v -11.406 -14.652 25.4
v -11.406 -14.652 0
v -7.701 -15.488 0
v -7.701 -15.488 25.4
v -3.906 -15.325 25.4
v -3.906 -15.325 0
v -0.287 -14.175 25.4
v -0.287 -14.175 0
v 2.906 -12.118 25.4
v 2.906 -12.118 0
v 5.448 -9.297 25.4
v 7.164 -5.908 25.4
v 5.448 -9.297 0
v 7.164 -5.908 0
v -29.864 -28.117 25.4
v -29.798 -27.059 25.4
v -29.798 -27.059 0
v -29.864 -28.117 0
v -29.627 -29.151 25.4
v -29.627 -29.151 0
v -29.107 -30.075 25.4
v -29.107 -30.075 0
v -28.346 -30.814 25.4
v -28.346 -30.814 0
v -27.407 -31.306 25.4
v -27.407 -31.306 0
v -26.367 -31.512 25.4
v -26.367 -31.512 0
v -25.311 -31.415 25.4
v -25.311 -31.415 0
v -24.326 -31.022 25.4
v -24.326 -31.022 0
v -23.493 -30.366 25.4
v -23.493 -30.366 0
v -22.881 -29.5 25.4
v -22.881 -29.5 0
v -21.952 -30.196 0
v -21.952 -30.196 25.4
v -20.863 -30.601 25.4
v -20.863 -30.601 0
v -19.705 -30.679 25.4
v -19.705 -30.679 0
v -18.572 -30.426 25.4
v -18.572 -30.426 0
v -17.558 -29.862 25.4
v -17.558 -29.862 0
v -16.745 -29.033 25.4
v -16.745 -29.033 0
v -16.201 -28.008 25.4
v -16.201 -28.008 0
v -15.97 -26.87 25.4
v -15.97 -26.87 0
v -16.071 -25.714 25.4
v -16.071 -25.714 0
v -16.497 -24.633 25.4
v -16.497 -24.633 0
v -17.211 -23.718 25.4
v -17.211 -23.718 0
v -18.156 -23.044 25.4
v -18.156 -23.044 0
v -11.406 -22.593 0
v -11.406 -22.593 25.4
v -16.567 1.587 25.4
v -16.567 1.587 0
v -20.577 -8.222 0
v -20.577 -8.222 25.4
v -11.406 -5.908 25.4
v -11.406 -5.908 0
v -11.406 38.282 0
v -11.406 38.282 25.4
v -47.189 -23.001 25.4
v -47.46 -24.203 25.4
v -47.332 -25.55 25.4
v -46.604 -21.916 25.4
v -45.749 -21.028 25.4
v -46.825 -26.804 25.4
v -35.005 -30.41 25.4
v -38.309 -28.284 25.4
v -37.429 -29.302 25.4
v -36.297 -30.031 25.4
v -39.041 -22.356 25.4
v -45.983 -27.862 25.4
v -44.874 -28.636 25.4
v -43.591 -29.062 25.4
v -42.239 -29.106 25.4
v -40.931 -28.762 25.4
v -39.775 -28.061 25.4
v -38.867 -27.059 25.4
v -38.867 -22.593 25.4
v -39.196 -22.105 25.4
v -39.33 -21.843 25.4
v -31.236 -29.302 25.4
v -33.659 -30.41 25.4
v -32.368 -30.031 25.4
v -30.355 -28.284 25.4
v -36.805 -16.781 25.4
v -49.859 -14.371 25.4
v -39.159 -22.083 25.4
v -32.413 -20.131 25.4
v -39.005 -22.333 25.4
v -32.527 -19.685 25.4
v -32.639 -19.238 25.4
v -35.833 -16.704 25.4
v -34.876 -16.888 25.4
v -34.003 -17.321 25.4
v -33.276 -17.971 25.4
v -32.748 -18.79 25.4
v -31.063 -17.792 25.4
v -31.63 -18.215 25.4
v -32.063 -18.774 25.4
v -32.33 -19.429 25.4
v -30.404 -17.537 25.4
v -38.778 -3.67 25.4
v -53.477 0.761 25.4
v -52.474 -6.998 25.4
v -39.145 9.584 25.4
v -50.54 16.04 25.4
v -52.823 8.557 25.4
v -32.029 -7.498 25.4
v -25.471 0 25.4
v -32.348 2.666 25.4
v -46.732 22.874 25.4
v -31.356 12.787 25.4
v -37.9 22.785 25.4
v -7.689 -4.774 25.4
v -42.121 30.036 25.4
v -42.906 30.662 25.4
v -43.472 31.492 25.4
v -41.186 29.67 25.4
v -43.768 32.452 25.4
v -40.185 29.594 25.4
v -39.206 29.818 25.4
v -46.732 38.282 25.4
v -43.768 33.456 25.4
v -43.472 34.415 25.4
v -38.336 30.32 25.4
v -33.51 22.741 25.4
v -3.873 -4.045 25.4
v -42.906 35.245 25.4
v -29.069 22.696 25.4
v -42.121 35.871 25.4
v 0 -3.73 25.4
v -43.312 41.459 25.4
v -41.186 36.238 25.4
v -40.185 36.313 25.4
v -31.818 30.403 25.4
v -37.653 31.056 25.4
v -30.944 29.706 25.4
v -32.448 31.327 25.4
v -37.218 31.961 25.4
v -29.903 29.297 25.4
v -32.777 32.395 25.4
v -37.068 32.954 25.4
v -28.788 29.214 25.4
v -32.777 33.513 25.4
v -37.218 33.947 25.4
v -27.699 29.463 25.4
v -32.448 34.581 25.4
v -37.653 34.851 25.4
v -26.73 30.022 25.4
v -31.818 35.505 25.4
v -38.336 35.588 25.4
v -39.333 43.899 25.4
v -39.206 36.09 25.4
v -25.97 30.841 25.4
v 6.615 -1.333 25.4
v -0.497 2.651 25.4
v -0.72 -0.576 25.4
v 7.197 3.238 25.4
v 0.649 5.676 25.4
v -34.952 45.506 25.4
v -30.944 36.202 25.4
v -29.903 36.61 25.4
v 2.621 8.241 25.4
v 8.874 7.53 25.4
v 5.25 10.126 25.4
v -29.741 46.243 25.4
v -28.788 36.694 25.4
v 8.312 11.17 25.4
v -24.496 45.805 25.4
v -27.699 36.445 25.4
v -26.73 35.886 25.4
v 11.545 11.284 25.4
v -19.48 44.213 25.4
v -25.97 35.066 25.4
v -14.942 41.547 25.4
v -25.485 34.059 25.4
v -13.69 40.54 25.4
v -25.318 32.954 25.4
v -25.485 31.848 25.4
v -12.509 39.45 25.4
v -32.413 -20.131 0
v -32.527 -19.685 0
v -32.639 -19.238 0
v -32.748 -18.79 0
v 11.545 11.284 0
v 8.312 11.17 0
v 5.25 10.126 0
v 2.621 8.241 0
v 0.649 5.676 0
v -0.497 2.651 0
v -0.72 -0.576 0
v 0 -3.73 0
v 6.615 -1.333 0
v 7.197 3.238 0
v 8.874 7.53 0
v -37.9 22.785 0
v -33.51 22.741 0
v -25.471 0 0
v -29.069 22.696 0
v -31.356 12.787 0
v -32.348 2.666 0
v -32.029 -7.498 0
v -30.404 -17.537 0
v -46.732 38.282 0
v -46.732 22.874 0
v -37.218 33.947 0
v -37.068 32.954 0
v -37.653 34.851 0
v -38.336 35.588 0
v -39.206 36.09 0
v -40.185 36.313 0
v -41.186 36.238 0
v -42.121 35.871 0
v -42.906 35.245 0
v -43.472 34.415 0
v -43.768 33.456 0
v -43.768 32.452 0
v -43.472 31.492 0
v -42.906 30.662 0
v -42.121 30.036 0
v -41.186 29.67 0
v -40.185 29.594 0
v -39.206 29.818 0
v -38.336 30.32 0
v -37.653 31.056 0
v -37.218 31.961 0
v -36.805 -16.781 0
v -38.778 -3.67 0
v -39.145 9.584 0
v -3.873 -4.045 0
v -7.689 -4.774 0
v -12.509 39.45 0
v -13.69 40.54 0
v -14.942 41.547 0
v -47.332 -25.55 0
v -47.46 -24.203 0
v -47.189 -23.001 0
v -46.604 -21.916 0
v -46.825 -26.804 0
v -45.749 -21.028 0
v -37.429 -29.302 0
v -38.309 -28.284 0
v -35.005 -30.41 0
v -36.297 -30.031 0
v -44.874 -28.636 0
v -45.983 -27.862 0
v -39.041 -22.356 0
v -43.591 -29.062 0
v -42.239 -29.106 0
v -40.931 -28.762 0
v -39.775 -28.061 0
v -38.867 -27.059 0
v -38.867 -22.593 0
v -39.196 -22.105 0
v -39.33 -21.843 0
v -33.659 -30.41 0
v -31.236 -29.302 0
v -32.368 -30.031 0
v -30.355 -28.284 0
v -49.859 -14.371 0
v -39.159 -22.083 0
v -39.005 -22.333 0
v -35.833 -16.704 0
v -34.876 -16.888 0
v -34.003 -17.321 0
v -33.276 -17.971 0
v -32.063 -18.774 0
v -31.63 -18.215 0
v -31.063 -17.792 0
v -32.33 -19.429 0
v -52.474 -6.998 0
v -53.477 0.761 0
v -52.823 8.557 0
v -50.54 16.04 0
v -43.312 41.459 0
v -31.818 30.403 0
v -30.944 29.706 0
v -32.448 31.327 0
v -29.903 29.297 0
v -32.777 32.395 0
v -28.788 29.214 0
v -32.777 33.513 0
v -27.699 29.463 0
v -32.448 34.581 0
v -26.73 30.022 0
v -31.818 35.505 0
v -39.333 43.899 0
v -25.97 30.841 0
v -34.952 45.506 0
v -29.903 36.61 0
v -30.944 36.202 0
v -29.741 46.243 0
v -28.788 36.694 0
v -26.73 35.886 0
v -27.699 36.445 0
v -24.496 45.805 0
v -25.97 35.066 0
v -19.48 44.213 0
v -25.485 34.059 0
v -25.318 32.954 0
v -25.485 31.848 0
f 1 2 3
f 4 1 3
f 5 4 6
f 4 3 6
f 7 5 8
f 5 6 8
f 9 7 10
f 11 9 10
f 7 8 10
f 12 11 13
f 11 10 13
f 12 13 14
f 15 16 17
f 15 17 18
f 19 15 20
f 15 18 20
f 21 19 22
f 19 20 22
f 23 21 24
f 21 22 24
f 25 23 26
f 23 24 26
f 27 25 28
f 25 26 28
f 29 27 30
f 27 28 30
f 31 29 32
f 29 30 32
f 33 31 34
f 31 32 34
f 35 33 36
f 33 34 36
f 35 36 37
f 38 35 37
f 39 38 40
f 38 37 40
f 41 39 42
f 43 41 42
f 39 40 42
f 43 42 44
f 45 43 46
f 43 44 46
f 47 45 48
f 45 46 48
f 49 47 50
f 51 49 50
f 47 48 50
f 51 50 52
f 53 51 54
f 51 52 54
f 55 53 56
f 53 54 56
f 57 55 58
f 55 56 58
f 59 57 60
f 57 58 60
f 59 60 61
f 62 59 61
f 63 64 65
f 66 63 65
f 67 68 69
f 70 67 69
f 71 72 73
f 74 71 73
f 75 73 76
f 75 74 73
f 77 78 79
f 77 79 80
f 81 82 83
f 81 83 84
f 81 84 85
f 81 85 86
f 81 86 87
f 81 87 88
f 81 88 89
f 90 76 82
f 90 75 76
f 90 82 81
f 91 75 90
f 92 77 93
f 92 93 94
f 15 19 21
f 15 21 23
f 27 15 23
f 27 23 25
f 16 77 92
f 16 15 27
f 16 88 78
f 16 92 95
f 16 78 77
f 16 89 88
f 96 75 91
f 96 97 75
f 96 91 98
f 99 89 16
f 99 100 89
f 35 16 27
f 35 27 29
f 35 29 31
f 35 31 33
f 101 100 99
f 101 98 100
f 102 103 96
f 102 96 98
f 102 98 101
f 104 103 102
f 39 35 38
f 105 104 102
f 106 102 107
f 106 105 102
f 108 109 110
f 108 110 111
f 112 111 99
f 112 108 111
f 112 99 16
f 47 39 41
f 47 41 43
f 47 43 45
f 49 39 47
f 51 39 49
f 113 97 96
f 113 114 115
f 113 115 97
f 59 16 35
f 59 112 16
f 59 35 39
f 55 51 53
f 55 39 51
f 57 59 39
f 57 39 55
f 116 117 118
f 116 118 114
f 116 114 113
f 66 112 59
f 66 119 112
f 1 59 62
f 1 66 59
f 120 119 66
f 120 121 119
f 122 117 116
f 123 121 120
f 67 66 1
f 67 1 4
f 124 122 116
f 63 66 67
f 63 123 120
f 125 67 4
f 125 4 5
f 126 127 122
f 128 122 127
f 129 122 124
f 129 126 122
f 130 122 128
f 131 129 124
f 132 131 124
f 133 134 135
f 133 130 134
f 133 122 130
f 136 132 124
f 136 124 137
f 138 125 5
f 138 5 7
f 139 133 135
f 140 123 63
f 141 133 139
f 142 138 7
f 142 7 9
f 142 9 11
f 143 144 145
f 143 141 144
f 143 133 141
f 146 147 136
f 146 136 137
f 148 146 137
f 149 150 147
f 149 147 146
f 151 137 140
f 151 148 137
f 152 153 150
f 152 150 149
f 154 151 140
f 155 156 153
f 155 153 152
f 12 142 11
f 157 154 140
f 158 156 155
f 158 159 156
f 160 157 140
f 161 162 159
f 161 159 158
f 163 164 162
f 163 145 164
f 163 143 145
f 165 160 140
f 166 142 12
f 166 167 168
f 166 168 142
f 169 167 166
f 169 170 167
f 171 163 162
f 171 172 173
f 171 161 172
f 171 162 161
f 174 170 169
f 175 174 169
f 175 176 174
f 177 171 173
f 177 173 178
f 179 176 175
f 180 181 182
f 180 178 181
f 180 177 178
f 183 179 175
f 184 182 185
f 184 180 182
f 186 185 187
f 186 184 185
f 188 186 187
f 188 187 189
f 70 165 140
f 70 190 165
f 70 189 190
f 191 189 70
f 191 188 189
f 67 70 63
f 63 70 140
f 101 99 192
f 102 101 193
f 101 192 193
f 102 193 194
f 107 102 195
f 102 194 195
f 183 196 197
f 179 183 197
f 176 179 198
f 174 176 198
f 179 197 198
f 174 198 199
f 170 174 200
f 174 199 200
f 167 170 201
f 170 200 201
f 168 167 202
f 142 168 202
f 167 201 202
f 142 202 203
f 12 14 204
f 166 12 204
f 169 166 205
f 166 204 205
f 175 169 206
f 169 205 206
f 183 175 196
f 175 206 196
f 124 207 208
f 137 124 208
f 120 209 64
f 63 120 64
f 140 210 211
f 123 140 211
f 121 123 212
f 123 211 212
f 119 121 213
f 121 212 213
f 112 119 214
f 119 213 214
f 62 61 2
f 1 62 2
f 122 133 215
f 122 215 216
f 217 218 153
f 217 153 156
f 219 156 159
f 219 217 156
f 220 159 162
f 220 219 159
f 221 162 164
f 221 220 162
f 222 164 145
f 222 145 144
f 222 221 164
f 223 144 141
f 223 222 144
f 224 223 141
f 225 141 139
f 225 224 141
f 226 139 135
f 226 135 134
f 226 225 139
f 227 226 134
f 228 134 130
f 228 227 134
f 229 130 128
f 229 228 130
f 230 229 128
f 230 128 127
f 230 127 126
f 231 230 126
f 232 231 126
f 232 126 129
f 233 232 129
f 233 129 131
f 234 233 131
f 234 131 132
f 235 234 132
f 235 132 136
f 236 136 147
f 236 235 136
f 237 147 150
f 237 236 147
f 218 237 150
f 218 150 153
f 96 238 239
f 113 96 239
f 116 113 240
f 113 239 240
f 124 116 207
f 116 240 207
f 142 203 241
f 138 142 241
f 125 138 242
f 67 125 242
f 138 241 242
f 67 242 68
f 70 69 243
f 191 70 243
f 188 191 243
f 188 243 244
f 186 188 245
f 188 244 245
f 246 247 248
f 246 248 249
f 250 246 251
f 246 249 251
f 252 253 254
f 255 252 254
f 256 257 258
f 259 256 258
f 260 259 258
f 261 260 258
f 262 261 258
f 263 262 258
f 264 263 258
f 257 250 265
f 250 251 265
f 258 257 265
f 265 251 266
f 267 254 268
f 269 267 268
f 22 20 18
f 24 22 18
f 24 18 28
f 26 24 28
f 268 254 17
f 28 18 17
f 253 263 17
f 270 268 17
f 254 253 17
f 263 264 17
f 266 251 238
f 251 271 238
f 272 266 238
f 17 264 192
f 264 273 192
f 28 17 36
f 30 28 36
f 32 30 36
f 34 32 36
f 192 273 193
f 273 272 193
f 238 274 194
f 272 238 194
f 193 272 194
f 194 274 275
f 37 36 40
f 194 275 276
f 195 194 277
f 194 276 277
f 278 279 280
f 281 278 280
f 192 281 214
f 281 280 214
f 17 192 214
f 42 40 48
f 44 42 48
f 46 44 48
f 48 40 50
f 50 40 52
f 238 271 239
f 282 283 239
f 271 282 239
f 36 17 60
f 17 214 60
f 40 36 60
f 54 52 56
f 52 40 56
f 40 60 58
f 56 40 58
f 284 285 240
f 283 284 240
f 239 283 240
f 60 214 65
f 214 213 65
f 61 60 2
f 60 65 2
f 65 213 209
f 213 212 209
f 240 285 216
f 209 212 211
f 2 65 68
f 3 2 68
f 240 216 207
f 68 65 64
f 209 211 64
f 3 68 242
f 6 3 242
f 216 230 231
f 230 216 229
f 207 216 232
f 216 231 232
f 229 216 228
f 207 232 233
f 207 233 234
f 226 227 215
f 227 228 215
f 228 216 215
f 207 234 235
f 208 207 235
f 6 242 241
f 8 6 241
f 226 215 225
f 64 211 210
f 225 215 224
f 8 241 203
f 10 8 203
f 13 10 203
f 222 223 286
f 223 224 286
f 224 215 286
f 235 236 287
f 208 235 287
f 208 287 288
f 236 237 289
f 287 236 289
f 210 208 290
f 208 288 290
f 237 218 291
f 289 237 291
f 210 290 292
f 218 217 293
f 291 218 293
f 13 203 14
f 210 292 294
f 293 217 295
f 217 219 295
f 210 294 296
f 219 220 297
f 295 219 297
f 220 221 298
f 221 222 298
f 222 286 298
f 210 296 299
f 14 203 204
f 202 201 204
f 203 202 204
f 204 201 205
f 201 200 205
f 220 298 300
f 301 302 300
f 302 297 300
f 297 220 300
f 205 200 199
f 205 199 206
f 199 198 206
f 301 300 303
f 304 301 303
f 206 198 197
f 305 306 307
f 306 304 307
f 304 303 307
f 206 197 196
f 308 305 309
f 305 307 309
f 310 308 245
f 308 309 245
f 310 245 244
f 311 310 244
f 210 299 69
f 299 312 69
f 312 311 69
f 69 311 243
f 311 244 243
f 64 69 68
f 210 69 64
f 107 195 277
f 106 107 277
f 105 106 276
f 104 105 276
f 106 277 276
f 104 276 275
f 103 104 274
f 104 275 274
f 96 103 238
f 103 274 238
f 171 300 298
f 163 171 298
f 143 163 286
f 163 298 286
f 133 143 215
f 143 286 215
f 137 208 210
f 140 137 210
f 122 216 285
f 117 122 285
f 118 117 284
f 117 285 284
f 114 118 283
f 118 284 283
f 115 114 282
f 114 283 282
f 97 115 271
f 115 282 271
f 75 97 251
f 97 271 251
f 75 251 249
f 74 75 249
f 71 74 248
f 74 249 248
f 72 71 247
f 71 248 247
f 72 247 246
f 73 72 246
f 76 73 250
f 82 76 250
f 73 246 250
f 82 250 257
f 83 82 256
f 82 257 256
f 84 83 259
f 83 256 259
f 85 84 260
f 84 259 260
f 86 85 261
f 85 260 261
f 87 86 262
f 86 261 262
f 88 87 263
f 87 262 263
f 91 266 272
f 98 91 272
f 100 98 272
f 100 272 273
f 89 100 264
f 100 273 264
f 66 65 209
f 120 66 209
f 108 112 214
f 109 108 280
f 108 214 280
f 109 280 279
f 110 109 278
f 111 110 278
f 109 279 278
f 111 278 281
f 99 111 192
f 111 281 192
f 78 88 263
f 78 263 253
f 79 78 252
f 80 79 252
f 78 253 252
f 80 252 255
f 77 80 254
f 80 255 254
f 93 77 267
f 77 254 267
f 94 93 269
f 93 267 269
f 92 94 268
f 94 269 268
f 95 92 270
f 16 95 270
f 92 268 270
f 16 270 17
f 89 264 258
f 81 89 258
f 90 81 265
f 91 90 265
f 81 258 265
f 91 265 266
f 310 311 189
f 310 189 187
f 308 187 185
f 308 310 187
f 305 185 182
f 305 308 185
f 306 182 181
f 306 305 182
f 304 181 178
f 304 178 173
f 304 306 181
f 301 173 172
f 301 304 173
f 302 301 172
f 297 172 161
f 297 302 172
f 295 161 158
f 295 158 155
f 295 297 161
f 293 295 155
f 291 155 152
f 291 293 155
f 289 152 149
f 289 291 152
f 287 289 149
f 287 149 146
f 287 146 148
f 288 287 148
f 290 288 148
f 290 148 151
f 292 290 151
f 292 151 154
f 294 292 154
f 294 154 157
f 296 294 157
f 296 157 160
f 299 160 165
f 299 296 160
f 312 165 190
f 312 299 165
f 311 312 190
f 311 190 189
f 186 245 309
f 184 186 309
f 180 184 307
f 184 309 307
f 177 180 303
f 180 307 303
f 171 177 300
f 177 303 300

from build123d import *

# Parameters (mm, degrees)
F0_R     = 3.3686848121
F0_R_2   = 3.7503411647
F1_DEPTH = 25.4


# Not quite as in the source:
# - the program builds the solid bodies; features that only make, move or delete a surface that nothing else refers to are left out


with BuildPart() as f1:
    # F0 (on Top) → F1 (new body)
    with BuildSketch(Plane.XY):
        with BuildLine():
            Line((-11.4056267505, -5.9082075022), (-11.4056267505, 38.28210113))
            ThreePointArc((-11.4056267505, 38.28210113), (-13.0902542949, 40.0050046024), (-14.9420781413, 41.5467940758))
            ThreePointArc((-14.9420781413, 41.5467940758), (-24.4960295494, 45.8046369765), (-34.9515650706, 45.5063239844))
            ThreePointArc((-34.9515650706, 45.5063239844), (-41.3833712338, 42.777482568), (-46.7318524877, 38.28210113))
            Line((-46.7318524877, 38.28210113), (-46.7318524877, 22.8735643321))
            Line((-46.7318524877, 22.8735643321), (-37.9002960534, 22.7850040211))
            Line((-37.9002960534, 22.7850040211), (-33.5099794506, 22.7409791874))
            Line((-33.5099794506, 22.7409791874), (-29.0687396191, 22.6964437101))
            ThreePointArc((-29.0687396191, 22.6964437101), (-32.3476402886, 2.6663309949), (-30.4037962217, -17.5370864196))
            ThreePointArc((-30.4037962217, -17.5370864196), (-28.3292963567, -17.9171307498), (-27.2098111607, -19.7045132715))
            ThreePointArc((-27.2098111607, -19.7045132715), (-22.8158840867, -19.1811881286), (-19.9977839656, -22.5927531719))
            ThreePointArc((-19.9977839656, -22.5927531719), (-19.0499304153, -22.7087900697), (-18.1556105797, -23.043577982))
            Line((-18.1556105797, -23.043577982), (-11.4056267505, -22.5927531719))
            Line((-11.4056267505, -22.5927531719), (-11.4056267505, -14.6515189691))
            ThreePointArc((-11.4056267505, -14.6515189691), (-0.2868217682, -14.1752443759), (7.1637327783, -5.9082075022))
            ThreePointArc((7.1637327783, -5.9082075022), (7.197230267, 3.2378107083), (11.5452415215, 11.2842738641))
            ThreePointArc((11.5452415215, 11.2842738641), (1.5408183988, 7.0311325334), (0, -3.7300742697))
            ThreePointArc((0, -3.7300742697), (-5.7908190197, -4.3583061138), (-11.4056267505, -5.9082075022))
        make_face()
        Polygon((-25.470810011, 0), (-16.5671050976, 1.5869429488), (-20.5766428262, -8.2222158089), align=None, mode=Mode.SUBTRACT)
        with Locations((-40.4367111623, 32.953761518)):
            Circle(F0_R, mode=Mode.SUBTRACT)
        with Locations((-29.0687396191, 32.953761518)):
            Circle(F0_R_2, mode=Mode.SUBTRACT)
        with BuildLine():
            Line((-37.9002960534, 22.7850040211), (-46.7318524877, 22.8735643321))
            ThreePointArc((-46.7318524877, 22.8735643321), (-53.4771270799, 0.7607999274), (-45.7492200512, -21.028016743))
            ThreePointArc((-45.7492200512, -21.028016743), (-44.0238078591, -20.1849073614), (-42.104174186, -20.131174475))
            ThreePointArc((-42.104174186, -20.131174475), (-40.558011078, -20.7291440142), (-39.3299119733, -21.8426791577))
            ThreePointArc((-39.3299119733, -21.8426791577), (-39.2808229847, -18.7066363859), (-36.8050348739, -16.7811112041))
            ThreePointArc((-36.8050348739, -16.7811112041), (-39.1633371869, 2.951823761), (-37.9002960534, 22.7850040211))
        make_face()
        with BuildLine():
            ThreePointArc((-42.104174186, -20.131174475), (-44.0238078591, -20.1849073614), (-45.7492200512, -21.028016743))
            ThreePointArc((-45.7492200512, -21.028016743), (-46.9337681485, -22.4383900317), (-47.4600126918, -24.2034321528))
            ThreePointArc((-47.4600126918, -24.2034321528), (-44.2480891567, -28.8954606668), (-38.8667027357, -27.059088003))
            ThreePointArc((-38.8667027357, -27.059088003), (-34.3322542596, -30.4586049869), (-29.7978057834, -27.059088003))
            ThreePointArc((-29.7978057834, -27.059088003), (-27.4071947516, -31.3060964302), (-22.8805579245, -29.5000895858))
            ThreePointArc((-22.8805579245, -29.5000895858), (-16.7448352708, -29.0331395554), (-18.1556105797, -23.043577982))
            ThreePointArc((-18.1556105797, -23.043577982), (-19.0499304153, -22.7087900697), (-19.9977839656, -22.5927531719))
            ThreePointArc((-19.9977839656, -22.5927531719), (-22.8158840867, -19.1811881286), (-27.2098111607, -19.7045132715))
            ThreePointArc((-27.2098111607, -19.7045132715), (-28.3292963567, -17.9171307498), (-30.4037962217, -17.5370864196))
            ThreePointArc((-30.4037962217, -17.5370864196), (-31.8655744774, -18.4799458919), (-32.4125880239, -20.131174475))
            ThreePointArc((-32.4125880239, -20.131174475), (-32.5829263413, -19.4613489943), (-32.7484000877, -18.7903052132))
            ThreePointArc((-32.7484000877, -18.7903052132), (-34.4248384474, -17.0752518162), (-36.8050348739, -16.7811112041))
            ThreePointArc((-36.8050348739, -16.7811112041), (-39.2808229847, -18.7066363859), (-39.3299119733, -21.8426791577))
            ThreePointArc((-39.3299119733, -21.8426791577), (-40.558011078, -20.7291440142), (-42.104174186, -20.131174475))
        make_face()
        with BuildLine():
            ThreePointArc((-38.8667027357, -22.5927531719), (-39.1211782585, -22.231840123), (-39.3299119733, -21.8426791577))
            ThreePointArc((-39.3299119733, -21.8426791577), (-39.0800443488, -22.2064378205), (-38.8667027357, -22.5927531719))
        make_face(mode=Mode.SUBTRACT)
    extrude(amount=F1_DEPTH)


solid = f1.part
